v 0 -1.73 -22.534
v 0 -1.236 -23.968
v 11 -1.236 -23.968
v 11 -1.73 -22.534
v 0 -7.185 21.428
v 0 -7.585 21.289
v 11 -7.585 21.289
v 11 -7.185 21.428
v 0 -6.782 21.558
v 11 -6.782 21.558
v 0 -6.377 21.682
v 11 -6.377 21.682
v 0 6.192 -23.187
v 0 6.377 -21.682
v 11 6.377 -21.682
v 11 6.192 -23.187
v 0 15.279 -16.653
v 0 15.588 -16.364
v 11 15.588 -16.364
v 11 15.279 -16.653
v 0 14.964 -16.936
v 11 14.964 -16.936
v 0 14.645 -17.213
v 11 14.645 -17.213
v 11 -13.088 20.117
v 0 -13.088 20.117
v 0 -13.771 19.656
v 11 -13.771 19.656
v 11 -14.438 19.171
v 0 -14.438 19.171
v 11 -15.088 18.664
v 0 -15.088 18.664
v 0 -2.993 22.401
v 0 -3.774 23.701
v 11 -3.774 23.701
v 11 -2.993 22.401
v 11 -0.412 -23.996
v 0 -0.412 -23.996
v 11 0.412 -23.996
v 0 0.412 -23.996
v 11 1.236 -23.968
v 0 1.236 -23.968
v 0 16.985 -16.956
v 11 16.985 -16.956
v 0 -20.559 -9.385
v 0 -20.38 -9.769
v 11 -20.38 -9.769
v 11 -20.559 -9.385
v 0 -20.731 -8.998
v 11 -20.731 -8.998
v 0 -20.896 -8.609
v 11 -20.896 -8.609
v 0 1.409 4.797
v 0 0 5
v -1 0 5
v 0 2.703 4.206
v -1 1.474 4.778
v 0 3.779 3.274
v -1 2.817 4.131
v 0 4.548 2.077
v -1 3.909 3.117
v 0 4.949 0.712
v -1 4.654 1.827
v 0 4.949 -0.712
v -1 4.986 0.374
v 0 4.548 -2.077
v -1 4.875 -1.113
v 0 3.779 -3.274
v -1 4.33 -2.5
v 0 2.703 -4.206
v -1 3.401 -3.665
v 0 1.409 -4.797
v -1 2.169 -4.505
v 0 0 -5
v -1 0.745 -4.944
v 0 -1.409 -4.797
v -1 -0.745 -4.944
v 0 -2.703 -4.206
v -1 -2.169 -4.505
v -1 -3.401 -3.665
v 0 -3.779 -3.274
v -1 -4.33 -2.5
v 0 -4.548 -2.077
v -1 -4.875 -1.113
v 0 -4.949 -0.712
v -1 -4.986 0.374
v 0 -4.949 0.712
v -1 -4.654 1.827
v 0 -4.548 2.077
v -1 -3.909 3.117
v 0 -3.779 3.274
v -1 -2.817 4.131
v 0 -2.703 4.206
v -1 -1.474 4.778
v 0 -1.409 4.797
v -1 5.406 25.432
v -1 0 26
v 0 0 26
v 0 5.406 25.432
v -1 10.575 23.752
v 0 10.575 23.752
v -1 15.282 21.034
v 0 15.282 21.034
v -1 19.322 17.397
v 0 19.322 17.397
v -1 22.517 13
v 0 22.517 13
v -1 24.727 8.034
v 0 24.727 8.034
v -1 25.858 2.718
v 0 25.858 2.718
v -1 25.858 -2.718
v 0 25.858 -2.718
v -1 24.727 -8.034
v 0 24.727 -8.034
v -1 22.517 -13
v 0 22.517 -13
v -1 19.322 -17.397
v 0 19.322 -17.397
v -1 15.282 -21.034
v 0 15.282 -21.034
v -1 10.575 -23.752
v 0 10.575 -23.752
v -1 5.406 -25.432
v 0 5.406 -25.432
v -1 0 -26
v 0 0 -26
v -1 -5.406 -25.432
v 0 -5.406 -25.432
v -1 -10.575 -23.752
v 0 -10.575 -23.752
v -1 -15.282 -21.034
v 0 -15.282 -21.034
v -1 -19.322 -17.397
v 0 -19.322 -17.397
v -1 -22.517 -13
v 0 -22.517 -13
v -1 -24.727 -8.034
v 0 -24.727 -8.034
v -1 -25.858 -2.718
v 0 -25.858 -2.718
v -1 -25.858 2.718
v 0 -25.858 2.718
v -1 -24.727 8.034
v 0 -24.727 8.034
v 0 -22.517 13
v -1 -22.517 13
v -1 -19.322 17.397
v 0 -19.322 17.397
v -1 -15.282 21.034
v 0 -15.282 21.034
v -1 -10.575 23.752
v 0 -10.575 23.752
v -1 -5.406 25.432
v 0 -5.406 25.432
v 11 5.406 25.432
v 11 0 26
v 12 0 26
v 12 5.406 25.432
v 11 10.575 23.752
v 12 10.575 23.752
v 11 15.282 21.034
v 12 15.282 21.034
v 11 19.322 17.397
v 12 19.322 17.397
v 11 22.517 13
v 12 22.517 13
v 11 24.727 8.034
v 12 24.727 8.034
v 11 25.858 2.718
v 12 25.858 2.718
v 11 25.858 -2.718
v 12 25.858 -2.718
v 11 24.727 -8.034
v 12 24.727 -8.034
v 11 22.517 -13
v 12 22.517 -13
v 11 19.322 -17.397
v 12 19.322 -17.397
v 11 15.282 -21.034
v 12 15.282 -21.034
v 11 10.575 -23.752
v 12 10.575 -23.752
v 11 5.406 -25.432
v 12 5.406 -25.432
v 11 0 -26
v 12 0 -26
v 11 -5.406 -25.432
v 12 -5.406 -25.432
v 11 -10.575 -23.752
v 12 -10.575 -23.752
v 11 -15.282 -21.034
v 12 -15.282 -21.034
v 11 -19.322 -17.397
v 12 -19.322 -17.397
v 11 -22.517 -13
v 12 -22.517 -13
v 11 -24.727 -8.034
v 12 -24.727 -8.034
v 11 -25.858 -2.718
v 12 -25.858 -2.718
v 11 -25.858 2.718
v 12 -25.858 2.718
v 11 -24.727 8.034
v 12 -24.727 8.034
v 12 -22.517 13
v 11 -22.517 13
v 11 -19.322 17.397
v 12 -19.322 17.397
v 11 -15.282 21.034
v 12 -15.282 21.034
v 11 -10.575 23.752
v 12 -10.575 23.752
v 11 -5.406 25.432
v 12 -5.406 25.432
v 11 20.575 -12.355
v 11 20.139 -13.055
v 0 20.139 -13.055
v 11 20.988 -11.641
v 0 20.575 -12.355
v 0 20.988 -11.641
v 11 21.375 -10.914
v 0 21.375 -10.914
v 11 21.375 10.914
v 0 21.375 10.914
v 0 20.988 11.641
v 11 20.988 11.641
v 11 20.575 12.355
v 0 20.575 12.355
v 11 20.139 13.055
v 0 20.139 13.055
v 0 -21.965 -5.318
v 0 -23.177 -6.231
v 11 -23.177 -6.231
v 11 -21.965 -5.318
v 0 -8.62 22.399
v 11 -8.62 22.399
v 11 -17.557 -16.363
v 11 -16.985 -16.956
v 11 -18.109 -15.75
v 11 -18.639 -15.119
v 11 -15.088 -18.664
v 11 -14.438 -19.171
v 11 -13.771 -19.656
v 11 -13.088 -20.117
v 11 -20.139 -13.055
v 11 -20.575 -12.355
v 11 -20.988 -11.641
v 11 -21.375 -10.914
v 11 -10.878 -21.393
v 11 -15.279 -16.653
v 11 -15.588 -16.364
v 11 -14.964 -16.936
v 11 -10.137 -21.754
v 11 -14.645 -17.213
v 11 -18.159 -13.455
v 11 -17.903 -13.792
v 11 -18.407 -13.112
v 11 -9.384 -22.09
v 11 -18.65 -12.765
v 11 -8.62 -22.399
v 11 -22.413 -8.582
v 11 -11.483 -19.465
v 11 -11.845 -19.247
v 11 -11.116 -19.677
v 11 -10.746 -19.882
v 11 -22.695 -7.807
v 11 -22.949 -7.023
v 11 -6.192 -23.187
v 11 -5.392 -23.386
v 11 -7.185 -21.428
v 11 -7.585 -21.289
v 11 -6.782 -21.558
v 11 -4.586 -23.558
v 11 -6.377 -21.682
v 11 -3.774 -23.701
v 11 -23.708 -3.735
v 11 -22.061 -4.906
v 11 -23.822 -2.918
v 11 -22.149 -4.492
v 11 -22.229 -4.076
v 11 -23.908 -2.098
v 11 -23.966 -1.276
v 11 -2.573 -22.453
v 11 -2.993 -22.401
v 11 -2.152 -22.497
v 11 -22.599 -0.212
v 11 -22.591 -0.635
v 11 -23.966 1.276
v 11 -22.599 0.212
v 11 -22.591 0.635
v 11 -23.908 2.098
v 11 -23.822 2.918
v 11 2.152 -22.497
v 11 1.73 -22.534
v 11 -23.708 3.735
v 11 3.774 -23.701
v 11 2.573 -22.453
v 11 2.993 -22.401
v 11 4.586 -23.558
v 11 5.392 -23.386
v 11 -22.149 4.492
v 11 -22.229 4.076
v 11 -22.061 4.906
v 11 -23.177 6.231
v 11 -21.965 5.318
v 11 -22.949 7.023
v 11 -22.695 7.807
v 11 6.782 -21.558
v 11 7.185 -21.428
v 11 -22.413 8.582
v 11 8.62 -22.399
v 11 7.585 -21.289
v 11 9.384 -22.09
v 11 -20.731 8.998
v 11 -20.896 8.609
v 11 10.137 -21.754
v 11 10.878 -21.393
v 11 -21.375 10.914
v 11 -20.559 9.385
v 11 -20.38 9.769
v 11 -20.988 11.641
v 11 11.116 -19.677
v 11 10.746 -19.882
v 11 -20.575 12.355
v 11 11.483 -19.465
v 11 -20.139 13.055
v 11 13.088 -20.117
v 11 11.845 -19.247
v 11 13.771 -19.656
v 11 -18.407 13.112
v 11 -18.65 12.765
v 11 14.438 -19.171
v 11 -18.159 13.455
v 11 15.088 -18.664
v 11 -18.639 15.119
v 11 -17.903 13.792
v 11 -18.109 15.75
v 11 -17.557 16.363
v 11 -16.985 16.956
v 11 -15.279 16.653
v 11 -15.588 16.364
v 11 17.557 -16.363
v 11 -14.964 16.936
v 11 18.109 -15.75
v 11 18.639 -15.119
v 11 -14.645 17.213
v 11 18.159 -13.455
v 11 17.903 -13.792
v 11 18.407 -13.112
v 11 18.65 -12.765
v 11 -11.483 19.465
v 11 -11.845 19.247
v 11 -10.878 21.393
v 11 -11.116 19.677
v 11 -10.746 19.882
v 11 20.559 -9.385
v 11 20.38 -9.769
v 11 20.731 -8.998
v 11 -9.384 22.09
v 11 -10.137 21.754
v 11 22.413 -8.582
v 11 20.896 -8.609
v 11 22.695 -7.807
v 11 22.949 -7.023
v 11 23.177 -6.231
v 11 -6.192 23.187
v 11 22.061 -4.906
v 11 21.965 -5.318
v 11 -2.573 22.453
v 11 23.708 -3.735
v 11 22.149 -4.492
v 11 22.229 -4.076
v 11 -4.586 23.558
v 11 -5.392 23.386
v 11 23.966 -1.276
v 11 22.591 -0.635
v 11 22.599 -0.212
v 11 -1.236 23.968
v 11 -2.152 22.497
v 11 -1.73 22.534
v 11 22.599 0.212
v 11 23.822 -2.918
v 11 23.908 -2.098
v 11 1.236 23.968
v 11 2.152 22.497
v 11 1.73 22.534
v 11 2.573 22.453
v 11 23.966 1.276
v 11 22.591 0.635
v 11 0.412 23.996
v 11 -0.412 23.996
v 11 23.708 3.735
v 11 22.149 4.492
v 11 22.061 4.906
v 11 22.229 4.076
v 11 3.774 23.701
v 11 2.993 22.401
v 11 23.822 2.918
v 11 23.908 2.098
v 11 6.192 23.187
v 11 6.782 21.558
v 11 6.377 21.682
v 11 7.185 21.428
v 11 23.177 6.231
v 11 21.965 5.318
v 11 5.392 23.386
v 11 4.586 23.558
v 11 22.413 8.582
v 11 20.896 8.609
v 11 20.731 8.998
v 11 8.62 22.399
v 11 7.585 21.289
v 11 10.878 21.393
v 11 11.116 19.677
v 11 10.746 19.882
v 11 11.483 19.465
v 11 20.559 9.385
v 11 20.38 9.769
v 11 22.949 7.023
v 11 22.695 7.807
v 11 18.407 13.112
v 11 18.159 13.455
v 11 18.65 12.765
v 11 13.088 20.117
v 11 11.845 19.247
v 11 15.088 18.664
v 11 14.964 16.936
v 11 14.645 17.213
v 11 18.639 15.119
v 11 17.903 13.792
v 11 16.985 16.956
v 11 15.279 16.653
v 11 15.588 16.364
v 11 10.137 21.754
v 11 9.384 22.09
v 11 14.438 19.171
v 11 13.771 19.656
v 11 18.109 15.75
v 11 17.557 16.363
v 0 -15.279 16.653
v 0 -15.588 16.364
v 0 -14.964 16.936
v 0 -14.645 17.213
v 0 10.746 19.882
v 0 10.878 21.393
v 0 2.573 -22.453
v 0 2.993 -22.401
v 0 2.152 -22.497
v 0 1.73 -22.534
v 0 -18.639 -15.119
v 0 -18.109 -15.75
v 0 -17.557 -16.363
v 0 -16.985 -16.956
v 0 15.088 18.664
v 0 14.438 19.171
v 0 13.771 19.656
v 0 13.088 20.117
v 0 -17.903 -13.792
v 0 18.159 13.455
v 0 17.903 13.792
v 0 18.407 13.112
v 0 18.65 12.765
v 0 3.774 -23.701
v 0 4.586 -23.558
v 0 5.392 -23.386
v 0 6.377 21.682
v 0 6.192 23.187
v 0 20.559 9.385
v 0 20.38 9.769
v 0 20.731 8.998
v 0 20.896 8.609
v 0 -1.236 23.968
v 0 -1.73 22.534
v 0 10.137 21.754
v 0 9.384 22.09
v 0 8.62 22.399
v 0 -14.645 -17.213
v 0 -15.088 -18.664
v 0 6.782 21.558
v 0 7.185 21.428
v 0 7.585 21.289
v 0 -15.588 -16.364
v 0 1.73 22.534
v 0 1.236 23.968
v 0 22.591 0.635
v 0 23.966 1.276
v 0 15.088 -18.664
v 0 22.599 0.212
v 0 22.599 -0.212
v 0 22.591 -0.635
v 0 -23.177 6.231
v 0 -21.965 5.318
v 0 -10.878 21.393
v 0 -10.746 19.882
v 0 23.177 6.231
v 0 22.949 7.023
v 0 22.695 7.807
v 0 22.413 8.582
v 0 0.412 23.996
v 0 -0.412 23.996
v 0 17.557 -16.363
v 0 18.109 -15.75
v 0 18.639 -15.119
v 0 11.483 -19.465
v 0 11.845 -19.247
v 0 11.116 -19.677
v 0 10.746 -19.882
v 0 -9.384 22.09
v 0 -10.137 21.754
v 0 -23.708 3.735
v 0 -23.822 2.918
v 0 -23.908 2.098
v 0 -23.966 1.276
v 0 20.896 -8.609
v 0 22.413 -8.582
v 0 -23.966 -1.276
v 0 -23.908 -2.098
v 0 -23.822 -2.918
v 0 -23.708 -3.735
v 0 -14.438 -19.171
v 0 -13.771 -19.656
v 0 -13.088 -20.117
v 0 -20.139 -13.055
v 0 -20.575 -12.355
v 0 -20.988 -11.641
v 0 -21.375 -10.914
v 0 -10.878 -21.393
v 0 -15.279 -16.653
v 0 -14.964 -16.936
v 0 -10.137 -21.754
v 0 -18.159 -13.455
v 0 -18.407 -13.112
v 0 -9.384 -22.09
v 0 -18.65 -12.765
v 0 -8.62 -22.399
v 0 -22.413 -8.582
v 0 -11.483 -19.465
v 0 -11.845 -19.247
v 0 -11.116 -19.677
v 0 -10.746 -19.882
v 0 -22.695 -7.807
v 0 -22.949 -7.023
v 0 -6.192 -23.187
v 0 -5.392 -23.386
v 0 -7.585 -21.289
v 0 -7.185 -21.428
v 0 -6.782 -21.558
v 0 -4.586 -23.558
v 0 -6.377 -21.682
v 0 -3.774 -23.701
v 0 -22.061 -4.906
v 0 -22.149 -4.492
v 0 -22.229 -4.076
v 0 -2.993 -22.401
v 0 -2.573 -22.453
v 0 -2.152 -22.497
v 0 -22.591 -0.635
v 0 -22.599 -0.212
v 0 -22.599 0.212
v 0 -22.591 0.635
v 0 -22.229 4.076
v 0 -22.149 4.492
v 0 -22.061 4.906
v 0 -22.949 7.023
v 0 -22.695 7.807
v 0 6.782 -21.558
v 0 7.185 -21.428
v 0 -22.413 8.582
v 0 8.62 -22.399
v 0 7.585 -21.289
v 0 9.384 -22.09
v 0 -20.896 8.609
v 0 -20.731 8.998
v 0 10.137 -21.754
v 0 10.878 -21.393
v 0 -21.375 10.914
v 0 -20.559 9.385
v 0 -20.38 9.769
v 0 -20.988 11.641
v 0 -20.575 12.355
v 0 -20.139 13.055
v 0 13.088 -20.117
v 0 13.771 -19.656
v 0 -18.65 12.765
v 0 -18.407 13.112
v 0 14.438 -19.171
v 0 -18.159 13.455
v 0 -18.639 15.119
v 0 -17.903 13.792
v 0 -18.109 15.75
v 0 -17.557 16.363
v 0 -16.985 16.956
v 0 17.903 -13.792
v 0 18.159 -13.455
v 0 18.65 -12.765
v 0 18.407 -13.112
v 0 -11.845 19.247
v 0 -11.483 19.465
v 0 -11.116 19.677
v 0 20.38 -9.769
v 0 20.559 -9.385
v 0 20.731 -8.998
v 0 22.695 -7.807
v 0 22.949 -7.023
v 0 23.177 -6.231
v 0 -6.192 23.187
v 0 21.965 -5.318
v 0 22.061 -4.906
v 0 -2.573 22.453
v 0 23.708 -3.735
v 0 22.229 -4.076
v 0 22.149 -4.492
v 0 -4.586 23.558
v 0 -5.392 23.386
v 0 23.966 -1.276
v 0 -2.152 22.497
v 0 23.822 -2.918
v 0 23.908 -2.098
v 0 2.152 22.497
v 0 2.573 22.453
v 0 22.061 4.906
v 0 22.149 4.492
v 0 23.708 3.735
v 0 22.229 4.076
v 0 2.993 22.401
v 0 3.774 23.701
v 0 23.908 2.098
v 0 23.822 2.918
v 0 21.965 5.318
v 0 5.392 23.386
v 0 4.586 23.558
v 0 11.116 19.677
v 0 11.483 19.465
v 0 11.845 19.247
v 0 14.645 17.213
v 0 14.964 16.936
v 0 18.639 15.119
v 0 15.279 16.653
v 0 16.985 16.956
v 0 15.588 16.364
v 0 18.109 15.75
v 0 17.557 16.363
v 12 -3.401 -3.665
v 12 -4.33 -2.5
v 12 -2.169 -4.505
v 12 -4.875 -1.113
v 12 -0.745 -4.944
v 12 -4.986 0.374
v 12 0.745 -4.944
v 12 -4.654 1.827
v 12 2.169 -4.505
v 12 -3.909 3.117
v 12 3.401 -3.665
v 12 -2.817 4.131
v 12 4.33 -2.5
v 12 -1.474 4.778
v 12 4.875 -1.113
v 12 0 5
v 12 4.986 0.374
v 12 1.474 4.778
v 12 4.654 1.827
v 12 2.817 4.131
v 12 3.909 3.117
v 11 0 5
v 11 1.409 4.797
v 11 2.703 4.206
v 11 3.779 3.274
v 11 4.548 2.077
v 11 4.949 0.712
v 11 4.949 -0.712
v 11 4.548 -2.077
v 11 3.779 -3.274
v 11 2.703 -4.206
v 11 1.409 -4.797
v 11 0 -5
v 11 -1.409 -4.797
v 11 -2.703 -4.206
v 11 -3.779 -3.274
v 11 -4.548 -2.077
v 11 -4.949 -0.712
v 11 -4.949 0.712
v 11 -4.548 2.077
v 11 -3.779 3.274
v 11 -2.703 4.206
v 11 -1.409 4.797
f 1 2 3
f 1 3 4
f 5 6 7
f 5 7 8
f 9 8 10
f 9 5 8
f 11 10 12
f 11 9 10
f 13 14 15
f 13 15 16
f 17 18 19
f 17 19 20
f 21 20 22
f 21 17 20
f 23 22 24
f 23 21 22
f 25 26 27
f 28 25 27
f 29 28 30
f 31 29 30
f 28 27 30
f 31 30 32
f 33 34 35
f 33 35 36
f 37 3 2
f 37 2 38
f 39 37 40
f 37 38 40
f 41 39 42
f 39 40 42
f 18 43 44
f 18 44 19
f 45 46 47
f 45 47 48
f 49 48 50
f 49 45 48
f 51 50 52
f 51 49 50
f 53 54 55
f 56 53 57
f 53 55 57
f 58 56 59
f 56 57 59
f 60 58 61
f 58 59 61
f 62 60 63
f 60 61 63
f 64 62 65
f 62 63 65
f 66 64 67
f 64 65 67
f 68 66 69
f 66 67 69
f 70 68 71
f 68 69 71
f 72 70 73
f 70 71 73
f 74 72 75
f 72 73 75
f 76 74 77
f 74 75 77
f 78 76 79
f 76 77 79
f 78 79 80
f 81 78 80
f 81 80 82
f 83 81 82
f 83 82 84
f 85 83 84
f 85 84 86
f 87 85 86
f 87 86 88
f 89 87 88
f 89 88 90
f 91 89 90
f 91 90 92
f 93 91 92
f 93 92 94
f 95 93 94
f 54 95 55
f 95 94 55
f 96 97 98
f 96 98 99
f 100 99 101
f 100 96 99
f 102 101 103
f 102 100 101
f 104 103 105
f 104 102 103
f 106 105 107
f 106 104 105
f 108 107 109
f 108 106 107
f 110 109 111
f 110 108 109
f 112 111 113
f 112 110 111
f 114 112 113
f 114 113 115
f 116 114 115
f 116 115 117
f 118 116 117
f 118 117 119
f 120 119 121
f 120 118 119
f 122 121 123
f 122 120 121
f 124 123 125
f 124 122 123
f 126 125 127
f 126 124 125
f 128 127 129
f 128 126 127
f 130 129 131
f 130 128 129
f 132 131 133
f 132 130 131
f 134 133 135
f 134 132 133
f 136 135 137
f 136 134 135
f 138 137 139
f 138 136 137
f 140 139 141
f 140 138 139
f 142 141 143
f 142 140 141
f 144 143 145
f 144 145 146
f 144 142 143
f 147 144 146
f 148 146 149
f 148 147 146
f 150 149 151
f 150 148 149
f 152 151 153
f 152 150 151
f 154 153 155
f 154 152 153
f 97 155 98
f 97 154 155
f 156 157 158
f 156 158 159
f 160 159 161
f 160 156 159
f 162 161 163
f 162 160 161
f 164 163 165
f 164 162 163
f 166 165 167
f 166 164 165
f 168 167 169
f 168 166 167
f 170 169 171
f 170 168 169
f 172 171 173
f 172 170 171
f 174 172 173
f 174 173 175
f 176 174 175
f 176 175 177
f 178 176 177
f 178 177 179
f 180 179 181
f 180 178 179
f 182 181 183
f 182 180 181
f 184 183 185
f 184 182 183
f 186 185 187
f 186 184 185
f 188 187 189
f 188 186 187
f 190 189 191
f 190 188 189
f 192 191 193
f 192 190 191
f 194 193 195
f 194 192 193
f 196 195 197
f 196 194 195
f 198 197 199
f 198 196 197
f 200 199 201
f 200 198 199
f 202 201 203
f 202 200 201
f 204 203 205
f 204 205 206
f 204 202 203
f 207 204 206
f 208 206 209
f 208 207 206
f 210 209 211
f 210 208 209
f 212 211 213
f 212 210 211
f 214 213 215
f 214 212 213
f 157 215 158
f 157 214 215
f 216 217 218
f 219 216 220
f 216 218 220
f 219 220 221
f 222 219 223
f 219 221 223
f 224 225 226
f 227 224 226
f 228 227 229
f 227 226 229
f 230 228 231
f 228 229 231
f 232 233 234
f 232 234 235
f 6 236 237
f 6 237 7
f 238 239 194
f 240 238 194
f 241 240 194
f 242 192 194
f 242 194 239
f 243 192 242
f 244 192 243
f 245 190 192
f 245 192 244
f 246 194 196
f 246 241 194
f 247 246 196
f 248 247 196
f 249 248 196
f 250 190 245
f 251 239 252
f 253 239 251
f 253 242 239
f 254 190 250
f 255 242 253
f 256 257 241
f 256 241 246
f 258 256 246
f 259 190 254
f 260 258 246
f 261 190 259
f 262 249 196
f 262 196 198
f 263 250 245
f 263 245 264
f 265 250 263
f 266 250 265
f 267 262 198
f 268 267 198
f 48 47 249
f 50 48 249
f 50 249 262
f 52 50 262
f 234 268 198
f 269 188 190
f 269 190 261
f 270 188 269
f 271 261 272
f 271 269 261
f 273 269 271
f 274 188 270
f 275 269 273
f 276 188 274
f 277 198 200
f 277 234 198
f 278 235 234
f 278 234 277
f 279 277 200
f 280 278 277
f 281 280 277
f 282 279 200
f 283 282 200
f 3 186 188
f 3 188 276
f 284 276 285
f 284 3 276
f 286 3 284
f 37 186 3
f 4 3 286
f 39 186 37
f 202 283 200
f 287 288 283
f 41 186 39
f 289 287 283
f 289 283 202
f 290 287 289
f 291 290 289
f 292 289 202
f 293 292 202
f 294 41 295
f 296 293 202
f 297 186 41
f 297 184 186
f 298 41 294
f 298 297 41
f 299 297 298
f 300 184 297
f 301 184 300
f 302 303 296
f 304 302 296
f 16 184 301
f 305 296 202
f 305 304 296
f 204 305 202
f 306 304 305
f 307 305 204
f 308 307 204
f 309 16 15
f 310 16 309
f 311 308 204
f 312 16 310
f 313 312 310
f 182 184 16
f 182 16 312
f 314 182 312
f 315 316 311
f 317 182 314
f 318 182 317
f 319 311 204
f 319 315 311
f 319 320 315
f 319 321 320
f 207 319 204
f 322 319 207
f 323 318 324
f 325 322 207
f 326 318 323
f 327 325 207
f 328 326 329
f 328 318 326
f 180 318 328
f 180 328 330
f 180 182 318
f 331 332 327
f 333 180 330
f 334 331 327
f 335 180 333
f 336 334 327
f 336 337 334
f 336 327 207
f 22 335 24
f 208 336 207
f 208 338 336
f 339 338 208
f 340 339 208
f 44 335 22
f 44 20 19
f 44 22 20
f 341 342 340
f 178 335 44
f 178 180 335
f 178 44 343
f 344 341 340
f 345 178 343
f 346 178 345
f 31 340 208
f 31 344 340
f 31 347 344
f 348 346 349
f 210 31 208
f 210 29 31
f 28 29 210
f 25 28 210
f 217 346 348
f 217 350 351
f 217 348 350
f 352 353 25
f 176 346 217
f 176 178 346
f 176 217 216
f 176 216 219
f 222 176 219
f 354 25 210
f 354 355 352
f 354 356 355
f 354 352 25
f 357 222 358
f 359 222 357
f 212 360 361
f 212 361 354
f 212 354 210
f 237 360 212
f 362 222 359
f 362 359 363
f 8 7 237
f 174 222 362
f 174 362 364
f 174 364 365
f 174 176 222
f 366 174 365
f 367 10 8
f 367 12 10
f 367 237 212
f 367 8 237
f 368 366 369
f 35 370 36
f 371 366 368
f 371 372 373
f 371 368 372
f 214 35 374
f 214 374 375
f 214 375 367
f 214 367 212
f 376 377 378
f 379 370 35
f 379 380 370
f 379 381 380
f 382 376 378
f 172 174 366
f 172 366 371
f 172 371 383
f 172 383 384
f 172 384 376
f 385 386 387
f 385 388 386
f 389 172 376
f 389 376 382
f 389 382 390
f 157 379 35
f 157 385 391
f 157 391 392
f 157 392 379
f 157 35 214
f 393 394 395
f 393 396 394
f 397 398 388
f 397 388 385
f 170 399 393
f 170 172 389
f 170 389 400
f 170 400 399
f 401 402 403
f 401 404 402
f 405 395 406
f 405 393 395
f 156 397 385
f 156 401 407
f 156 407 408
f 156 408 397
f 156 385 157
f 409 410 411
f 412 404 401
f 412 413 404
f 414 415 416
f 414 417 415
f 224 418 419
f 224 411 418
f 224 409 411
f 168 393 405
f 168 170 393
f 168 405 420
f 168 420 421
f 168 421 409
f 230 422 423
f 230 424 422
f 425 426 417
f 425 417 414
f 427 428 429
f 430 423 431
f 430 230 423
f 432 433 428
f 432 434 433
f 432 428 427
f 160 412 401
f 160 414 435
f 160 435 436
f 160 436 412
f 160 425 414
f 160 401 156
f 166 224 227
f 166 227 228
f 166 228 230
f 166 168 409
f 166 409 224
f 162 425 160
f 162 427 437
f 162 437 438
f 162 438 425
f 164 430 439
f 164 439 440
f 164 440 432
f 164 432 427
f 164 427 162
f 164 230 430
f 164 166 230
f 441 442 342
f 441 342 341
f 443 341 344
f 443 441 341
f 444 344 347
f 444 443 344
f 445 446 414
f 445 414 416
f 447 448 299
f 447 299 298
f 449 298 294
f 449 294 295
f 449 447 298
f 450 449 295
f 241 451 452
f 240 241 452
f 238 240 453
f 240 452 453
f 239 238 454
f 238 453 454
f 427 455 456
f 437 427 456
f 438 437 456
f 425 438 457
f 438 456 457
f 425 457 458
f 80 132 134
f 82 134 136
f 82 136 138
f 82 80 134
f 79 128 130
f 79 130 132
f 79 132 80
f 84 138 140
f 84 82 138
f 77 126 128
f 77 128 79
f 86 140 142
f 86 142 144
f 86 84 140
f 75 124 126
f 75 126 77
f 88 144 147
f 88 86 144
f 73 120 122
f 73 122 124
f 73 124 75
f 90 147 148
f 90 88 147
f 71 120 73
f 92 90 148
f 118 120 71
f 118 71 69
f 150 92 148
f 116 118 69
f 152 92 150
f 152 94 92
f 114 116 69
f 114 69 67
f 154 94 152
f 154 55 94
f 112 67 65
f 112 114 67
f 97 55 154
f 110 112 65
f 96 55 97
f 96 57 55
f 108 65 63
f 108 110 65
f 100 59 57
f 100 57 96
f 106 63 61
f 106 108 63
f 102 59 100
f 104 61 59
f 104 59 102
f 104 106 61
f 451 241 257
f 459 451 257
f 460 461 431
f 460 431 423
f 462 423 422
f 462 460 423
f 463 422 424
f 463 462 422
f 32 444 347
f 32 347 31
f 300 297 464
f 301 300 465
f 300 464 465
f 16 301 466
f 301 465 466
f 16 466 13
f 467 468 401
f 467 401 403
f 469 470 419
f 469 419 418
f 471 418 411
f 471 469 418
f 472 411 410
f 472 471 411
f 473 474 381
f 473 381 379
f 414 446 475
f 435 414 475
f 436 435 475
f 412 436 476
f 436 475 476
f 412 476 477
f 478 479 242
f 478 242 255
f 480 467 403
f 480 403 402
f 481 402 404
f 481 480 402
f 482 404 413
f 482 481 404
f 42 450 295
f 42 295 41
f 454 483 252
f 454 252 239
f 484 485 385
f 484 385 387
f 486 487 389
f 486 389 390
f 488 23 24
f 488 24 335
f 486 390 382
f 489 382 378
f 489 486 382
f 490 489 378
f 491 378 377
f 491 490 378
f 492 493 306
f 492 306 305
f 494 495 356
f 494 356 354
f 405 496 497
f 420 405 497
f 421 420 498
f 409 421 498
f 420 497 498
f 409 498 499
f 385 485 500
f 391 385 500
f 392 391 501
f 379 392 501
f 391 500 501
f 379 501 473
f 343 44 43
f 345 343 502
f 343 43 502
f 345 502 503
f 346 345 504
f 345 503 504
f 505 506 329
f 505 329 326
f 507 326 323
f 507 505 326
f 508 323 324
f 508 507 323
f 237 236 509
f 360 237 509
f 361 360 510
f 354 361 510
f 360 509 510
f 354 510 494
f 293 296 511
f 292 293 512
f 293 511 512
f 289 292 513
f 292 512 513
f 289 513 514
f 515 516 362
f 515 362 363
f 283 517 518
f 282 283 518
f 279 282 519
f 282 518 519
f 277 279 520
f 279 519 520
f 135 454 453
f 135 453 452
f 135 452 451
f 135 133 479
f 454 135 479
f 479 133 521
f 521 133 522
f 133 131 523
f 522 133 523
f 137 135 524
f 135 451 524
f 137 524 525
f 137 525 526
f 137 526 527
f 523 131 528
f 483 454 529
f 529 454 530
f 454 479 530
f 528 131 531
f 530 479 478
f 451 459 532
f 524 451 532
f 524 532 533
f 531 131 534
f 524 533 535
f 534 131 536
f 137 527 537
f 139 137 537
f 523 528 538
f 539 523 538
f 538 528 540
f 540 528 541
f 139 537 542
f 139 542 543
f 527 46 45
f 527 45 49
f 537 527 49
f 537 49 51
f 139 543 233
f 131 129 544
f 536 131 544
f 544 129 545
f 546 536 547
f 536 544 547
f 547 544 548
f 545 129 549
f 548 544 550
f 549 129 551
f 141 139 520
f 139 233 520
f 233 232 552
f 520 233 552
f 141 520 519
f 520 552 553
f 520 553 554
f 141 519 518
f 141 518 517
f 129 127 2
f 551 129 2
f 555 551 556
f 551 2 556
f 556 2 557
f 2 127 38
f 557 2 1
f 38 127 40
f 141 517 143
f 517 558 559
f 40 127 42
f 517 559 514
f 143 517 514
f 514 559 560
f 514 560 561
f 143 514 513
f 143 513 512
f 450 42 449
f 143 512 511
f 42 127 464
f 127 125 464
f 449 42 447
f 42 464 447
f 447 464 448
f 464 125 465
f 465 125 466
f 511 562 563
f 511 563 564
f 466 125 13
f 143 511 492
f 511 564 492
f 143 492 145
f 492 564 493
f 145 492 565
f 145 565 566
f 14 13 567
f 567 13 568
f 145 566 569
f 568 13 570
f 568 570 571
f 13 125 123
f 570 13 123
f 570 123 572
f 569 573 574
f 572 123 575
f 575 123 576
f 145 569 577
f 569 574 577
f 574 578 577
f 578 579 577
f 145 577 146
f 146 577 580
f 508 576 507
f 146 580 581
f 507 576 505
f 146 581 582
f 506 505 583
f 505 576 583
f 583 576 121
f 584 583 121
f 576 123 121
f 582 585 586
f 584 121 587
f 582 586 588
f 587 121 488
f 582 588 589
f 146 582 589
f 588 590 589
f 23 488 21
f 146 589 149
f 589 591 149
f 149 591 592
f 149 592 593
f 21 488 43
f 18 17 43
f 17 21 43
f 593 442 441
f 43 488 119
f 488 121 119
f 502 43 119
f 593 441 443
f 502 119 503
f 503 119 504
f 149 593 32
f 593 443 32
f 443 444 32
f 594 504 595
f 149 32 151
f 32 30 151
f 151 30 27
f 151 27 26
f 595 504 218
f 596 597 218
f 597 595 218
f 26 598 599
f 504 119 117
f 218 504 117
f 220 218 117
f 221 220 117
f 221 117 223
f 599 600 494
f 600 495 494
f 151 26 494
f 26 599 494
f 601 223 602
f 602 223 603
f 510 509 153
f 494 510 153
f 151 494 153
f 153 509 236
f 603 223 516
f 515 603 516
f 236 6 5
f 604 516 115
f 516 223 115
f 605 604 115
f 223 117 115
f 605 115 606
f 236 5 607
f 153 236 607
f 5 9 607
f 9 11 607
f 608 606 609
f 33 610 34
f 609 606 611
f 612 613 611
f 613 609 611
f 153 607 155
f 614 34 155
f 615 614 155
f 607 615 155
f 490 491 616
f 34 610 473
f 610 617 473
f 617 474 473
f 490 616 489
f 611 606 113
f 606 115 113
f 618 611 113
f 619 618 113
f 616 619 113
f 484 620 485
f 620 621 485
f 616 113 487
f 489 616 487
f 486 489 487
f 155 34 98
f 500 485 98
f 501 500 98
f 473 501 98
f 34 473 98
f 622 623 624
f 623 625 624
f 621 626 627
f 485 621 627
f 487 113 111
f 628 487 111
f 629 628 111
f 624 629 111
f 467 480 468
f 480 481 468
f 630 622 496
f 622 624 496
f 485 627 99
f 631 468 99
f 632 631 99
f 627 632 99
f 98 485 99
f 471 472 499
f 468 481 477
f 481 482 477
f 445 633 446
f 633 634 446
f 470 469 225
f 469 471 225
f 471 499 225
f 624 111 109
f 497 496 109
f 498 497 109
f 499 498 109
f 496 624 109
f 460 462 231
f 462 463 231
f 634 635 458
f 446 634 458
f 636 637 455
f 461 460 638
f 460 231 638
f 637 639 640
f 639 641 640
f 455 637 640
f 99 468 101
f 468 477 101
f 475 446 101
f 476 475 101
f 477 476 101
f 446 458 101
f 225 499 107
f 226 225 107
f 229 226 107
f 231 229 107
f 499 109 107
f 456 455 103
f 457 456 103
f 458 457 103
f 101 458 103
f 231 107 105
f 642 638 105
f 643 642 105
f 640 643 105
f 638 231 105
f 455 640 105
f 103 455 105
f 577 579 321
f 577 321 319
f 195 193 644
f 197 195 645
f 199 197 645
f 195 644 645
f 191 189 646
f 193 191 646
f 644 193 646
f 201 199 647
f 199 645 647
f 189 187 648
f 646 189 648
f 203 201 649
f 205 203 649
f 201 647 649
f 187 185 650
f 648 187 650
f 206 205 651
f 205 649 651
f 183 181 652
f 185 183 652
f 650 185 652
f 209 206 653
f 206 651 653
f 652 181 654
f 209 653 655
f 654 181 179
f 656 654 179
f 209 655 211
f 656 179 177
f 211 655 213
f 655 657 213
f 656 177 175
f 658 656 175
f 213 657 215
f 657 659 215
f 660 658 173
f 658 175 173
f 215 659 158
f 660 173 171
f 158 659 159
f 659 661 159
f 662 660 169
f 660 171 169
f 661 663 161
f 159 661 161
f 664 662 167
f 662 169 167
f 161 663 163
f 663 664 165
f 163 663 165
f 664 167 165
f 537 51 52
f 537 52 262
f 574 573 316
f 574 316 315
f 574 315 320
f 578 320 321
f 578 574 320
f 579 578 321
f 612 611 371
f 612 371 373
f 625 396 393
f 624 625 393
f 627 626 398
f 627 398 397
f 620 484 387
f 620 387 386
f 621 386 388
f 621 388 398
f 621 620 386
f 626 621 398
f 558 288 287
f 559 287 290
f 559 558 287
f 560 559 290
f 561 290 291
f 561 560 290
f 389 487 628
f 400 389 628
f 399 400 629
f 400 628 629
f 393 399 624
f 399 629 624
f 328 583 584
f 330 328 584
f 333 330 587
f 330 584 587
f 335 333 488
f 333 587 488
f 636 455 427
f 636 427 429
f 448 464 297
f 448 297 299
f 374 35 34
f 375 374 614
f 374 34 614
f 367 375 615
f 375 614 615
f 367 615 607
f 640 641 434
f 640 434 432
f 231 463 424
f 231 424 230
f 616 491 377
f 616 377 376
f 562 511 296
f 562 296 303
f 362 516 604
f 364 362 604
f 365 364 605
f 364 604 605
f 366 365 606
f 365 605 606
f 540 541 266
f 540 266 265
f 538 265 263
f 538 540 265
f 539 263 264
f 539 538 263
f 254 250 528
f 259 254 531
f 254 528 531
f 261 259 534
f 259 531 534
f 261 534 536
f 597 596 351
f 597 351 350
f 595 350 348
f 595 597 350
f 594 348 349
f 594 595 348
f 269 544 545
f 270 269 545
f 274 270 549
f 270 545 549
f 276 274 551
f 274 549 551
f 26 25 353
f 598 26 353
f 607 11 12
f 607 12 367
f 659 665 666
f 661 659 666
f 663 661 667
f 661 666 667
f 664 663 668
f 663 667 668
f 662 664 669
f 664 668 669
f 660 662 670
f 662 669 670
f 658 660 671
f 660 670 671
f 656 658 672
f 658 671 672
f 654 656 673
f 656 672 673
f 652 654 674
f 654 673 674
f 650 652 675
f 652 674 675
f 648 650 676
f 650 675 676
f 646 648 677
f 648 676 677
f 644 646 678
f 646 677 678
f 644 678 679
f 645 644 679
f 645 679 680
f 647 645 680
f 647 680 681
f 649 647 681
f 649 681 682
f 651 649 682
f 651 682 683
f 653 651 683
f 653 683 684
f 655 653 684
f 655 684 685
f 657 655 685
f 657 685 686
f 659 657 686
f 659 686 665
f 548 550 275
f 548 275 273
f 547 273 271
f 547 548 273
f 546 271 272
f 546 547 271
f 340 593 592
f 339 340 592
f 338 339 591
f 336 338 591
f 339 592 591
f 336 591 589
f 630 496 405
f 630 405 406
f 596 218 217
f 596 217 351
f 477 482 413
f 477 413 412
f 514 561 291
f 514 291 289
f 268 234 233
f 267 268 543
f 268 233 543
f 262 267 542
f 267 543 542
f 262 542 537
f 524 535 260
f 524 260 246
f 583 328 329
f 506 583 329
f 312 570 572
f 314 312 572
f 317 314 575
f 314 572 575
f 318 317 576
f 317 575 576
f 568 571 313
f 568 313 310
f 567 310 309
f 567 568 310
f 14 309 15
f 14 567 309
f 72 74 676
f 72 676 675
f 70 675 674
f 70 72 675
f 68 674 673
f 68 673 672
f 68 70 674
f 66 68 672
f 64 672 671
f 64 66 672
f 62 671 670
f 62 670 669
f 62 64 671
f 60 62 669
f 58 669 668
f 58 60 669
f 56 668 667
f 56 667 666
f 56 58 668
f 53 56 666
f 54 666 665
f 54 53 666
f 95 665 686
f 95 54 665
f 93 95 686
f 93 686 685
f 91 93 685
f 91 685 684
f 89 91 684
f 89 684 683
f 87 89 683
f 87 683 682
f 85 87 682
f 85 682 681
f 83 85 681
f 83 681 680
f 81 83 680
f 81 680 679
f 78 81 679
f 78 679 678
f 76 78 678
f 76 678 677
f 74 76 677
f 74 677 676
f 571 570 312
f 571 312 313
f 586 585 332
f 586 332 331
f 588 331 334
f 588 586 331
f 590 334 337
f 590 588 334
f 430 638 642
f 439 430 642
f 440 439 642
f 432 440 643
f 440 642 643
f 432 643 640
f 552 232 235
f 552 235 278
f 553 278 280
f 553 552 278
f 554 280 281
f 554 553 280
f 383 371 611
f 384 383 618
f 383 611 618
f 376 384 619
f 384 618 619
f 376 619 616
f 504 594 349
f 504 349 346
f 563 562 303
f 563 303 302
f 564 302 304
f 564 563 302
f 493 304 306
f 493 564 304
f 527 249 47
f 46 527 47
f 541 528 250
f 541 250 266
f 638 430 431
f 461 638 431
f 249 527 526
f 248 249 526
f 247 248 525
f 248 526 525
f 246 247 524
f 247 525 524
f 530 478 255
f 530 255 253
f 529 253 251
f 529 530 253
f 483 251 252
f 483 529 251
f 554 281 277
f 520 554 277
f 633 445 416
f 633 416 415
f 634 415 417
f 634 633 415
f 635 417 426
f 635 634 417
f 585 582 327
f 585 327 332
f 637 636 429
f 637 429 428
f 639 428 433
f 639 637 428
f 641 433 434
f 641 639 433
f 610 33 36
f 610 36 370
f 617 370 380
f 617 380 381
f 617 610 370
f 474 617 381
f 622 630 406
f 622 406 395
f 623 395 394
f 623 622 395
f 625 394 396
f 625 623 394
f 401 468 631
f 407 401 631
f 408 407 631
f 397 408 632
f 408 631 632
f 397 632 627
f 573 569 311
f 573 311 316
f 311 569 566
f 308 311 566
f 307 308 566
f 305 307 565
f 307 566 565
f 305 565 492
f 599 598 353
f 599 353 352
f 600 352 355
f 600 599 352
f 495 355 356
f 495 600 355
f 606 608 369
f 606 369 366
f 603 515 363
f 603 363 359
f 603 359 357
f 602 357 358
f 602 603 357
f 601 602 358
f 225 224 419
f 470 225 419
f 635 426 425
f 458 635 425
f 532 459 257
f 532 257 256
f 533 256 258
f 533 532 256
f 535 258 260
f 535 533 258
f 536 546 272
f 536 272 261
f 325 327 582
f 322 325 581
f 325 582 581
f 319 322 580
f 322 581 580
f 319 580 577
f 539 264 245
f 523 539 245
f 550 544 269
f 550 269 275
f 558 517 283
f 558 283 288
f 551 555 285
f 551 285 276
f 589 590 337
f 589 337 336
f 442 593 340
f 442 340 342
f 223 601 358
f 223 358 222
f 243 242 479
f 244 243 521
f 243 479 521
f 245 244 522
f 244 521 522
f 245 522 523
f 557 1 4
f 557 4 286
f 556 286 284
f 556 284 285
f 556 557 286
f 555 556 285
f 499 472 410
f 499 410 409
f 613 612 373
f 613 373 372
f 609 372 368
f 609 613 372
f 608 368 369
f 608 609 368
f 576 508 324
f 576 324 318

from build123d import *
from build123d.topology import SkipClean

# Parameters (mm, degrees)
SKETCH1_R           = 24
SKETCH1_R_2         = 5
BOSS_EXTRUDE1_DEPTH = 11
CUT_EXTRUDE1_DEPTH  = 36.67912555
BOSS_EXTRUDE2_START = 1
SKETCH3_R           = 26
SKETCH3_R_2         = 5
BOSS_EXTRUDE2_DEPTH = 1
LPATTERN1_COUNT     = 2
LPATTERN1_PITCH     = 12


with BuildPart() as part:
    # Sketch1 → Boss-Extrude1 (new body)
    with BuildSketch(Plane(origin=(0, 0, 0), x_dir=(0, 0, -1), z_dir=(1, 0, 0))):
        Circle(SKETCH1_R)
        Circle(SKETCH1_R_2, mode=Mode.SUBTRACT)
    extrude(amount=BOSS_EXTRUDE1_DEPTH)

    # Sketch2 → Cut-Extrude1 (cut, through all)
    with BuildSketch(Plane.ZY):
        with BuildLine():
            Line((1.276076386, 23.966051595), (0.634916452, 22.59107968))
            ThreePointArc((0.634916452, 22.59107968), (0, 22.6), (-0.634916452, 22.59107968))
            Line((-0.634916452, 22.59107968), (-1.276076386, 23.966051595))
            ThreePointArc((-1.276076386, 23.966051595), (0, 24), (1.276076386, 23.966051595))
        make_face()
        with BuildLine():
            Line((6.231013365, 23.177024668), (5.317991578, 21.965403834))
            ThreePointArc((5.317991578, 21.965403834), (4.698804212, 22.106135777), (4.075907569, 22.22941694))
            Line((4.075907569, 22.22941694), (3.734631254, 23.707647066))
            ThreePointArc((3.734631254, 23.707647066), (4.98988058, 23.475542418), (6.231013365, 23.177024668))
        make_face()
        with BuildLine():
            Line((10.913625159, 21.375050547), (9.768644953, 20.379734438))
            ThreePointArc((9.768644953, 20.379734438), (9.192248134, 20.646127343), (8.608594872, 20.896222011))
            Line((8.608594872, 20.896222011), (8.582117588, 22.413104598))
            ThreePointArc((8.582117588, 22.413104598), (9.761679434, 21.925090983), (10.913625159, 21.375050547))
        make_face()
        with BuildLine():
            Line((15.119259166, 18.638884148), (13.792361669, 17.903372855))
            ThreePointArc((13.792361669, 17.903372855), (13.283946702, 18.283784073), (12.765045269, 18.649761909))
            Line((12.765045269, 18.649761909), (13.054524201, 20.139001909))
            ThreePointArc((13.054524201, 20.139001909), (14.106846055, 19.416407865), (15.119259166, 18.638884148))
        make_face()
        with BuildLine():
            Line((18.664108996, 15.088109073), (17.213285997, 14.644547969))
            ThreePointArc((17.213285997, 14.644547969), (16.795073056, 15.122351704), (16.363601935, 15.58821772))
            Line((16.363601935, 15.58821772), (16.956385464, 16.984728199))
            ThreePointArc((16.956385464, 16.984728199), (17.835475811, 16.059134553), (18.664108996, 15.088109073))
        make_face()
        with BuildLine():
            Line((21.393247703, 10.87791123), (19.881907128, 10.745686063))
            ThreePointArc((19.881907128, 10.745686063), (19.572174126, 11.3), (19.246990676, 11.845393617))
            Line((19.246990676, 11.845393617), (20.117171317, 13.088140365))
            ThreePointArc((20.117171317, 13.088140365), (20.784609691, 12), (21.393247703, 10.87791123))
        make_face()
        with BuildLine():
            Line((23.187398829, 6.192296469), (21.681593513, 6.377186113))
            ThreePointArc((21.681593513, 6.377186113), (21.493877268, 6.983784073), (21.289193566, 7.584868971))
            Line((21.289193566, 7.584868971), (22.39874025, 8.619537993))
            ThreePointArc((22.39874025, 8.619537993), (22.825356391, 7.416407865), (23.187398829, 6.192296469))
        make_face()
        with BuildLine():
            Line((23.96814936, 1.236048638), (22.533690223, 1.729972529))
            ThreePointArc((22.533690223, 1.729972529), (22.476194835, 2.36234327), (22.400956541, 2.992849156))
            Line((22.400956541, 2.992849156), (23.701376753, 3.77422045))
            ThreePointArc((23.701376753, 3.77422045), (23.868525489, 2.508683118), (23.96814936, 1.236048638))
        make_face()
        with BuildLine():
            Line((23.701376753, -3.77422045), (22.400956541, -2.992849156))
            ThreePointArc((22.400956541, -2.992849156), (22.476194835, -2.36234327), (22.533690223, -1.729972529))
            Line((22.533690223, -1.729972529), (23.96814936, -1.236048638))
            ThreePointArc((23.96814936, -1.236048638), (23.868525489, -2.508683118), (23.701376753, -3.77422045))
        make_face()
        with BuildLine():
            Line((22.39874025, -8.619537993), (21.289193566, -7.584868971))
            ThreePointArc((21.289193566, -7.584868971), (21.493877268, -6.983784073), (21.681593513, -6.377186113))
            Line((21.681593513, -6.377186113), (23.187398829, -6.192296469))
            ThreePointArc((23.187398829, -6.192296469), (22.825356391, -7.416407865), (22.39874025, -8.619537993))
        make_face()
        with BuildLine():
            Line((20.117171317, -13.088140365), (19.246990676, -11.845393617))
            ThreePointArc((19.246990676, -11.845393617), (19.572174126, -11.3), (19.881907128, -10.745686063))
            Line((19.881907128, -10.745686063), (21.393247703, -10.87791123))
            ThreePointArc((21.393247703, -10.87791123), (20.784609691, -12), (20.117171317, -13.088140365))
        make_face()
        with BuildLine():
            Line((16.956385464, -16.984728199), (16.363601935, -15.58821772))
            ThreePointArc((16.363601935, -15.58821772), (16.795073056, -15.122351704), (17.213285997, -14.644547969))
            Line((17.213285997, -14.644547969), (18.664108996, -15.088109073))
            ThreePointArc((18.664108996, -15.088109073), (17.835475811, -16.059134553), (16.956385464, -16.984728199))
        make_face()
        with BuildLine():
            Line((13.054524201, -20.139001909), (12.765045269, -18.649761909))
            ThreePointArc((12.765045269, -18.649761909), (13.283946702, -18.283784073), (13.792361669, -17.903372855))
            Line((13.792361669, -17.903372855), (15.119259166, -18.638884148))
            ThreePointArc((15.119259166, -18.638884148), (14.106846055, -19.416407865), (13.054524201, -20.139001909))
        make_face()
        with BuildLine():
            Line((8.582117588, -22.413104598), (8.608594872, -20.896222011))
            ThreePointArc((8.608594872, -20.896222011), (9.192248134, -20.646127343), (9.768644953, -20.379734438))
            Line((9.768644953, -20.379734438), (10.913625159, -21.375050547))
            ThreePointArc((10.913625159, -21.375050547), (9.761679434, -21.925090983), (8.582117588, -22.413104598))
        make_face()
        with BuildLine():
            Line((3.734631254, -23.707647066), (4.075907569, -22.22941694))
            ThreePointArc((4.075907569, -22.22941694), (4.698804212, -22.106135777), (5.317991578, -21.965403834))
            Line((5.317991578, -21.965403834), (6.231013365, -23.177024668))
            ThreePointArc((6.231013365, -23.177024668), (4.98988058, -23.475542418), (3.734631254, -23.707647066))
        make_face()
        with BuildLine():
            Line((-1.276076386, -23.966051595), (-0.634916452, -22.59107968))
            ThreePointArc((-0.634916452, -22.59107968), (0, -22.6), (0.634916452, -22.59107968))
            Line((0.634916452, -22.59107968), (1.276076386, -23.966051595))
            ThreePointArc((1.276076386, -23.966051595), (0, -24), (-1.276076386, -23.966051595))
        make_face()
        with BuildLine():
            Line((-6.231013365, -23.177024668), (-5.317991578, -21.965403834))
            ThreePointArc((-5.317991578, -21.965403834), (-4.698804212, -22.106135777), (-4.075907569, -22.22941694))
            Line((-4.075907569, -22.22941694), (-3.734631254, -23.707647066))
            ThreePointArc((-3.734631254, -23.707647066), (-4.98988058, -23.475542418), (-6.231013365, -23.177024668))
        make_face()
        with BuildLine():
            Line((-10.913625159, -21.375050547), (-9.768644953, -20.379734438))
            ThreePointArc((-9.768644953, -20.379734438), (-9.192248134, -20.646127343), (-8.608594872, -20.896222011))
            Line((-8.608594872, -20.896222011), (-8.582117588, -22.413104598))
            ThreePointArc((-8.582117588, -22.413104598), (-9.761679434, -21.925090983), (-10.913625159, -21.375050547))
        make_face()
        with BuildLine():
            Line((-15.119259166, -18.638884148), (-13.792361669, -17.903372855))
            ThreePointArc((-13.792361669, -17.903372855), (-13.283946702, -18.283784073), (-12.765045269, -18.649761909))
            Line((-12.765045269, -18.649761909), (-13.054524201, -20.139001909))
            ThreePointArc((-13.054524201, -20.139001909), (-14.106846055, -19.416407865), (-15.119259166, -18.638884148))
        make_face()
        with BuildLine():
            Line((-18.664108996, -15.088109073), (-17.213285997, -14.644547969))
            ThreePointArc((-17.213285997, -14.644547969), (-16.795073056, -15.122351704), (-16.363601935, -15.58821772))
            Line((-16.363601935, -15.58821772), (-16.956385464, -16.984728199))
            ThreePointArc((-16.956385464, -16.984728199), (-17.835475811, -16.059134553), (-18.664108996, -15.088109073))
        make_face()
        with BuildLine():
            Line((-21.393247703, -10.87791123), (-19.881907128, -10.745686063))
            ThreePointArc((-19.881907128, -10.745686063), (-19.572174126, -11.3), (-19.246990676, -11.845393617))
            Line((-19.246990676, -11.845393617), (-20.117171317, -13.088140365))
            ThreePointArc((-20.117171317, -13.088140365), (-20.784609691, -12), (-21.393247703, -10.87791123))
        make_face()
        with BuildLine():
            Line((-23.187398829, -6.192296469), (-21.681593513, -6.377186113))
            ThreePointArc((-21.681593513, -6.377186113), (-21.493877268, -6.983784073), (-21.289193566, -7.584868971))
            Line((-21.289193566, -7.584868971), (-22.39874025, -8.619537993))
            ThreePointArc((-22.39874025, -8.619537993), (-22.825356391, -7.416407865), (-23.187398829, -6.192296469))
        make_face()
        with BuildLine():
            Line((-23.96814936, -1.236048638), (-22.533690223, -1.729972529))
            ThreePointArc((-22.533690223, -1.729972529), (-22.476194835, -2.36234327), (-22.400956541, -2.992849156))
            Line((-22.400956541, -2.992849156), (-23.701376753, -3.77422045))
            ThreePointArc((-23.701376753, -3.77422045), (-23.868525489, -2.508683118), (-23.96814936, -1.236048638))
        make_face()
        with BuildLine():
            Line((-23.701376753, 3.77422045), (-22.400956541, 2.992849156))
            ThreePointArc((-22.400956541, 2.992849156), (-22.476194835, 2.36234327), (-22.533690223, 1.729972529))
            Line((-22.533690223, 1.729972529), (-23.96814936, 1.236048638))
            ThreePointArc((-23.96814936, 1.236048638), (-23.868525489, 2.508683118), (-23.701376753, 3.77422045))
        make_face()
        with BuildLine():
            Line((-22.39874025, 8.619537993), (-21.289193566, 7.584868971))
            ThreePointArc((-21.289193566, 7.584868971), (-21.493877268, 6.983784073), (-21.681593513, 6.377186113))
            Line((-21.681593513, 6.377186113), (-23.187398829, 6.192296469))
            ThreePointArc((-23.187398829, 6.192296469), (-22.825356391, 7.416407865), (-22.39874025, 8.619537993))
        make_face()
        with BuildLine():
            Line((-20.117171317, 13.088140365), (-19.246990676, 11.845393617))
            ThreePointArc((-19.246990676, 11.845393617), (-19.572174126, 11.3), (-19.881907128, 10.745686063))
            Line((-19.881907128, 10.745686063), (-21.393247703, 10.87791123))
            ThreePointArc((-21.393247703, 10.87791123), (-20.784609691, 12), (-20.117171317, 13.088140365))
        make_face()
        with BuildLine():
            Line((-16.956385464, 16.984728199), (-16.363601935, 15.58821772))
            ThreePointArc((-16.363601935, 15.58821772), (-16.795073056, 15.122351704), (-17.213285997, 14.644547969))
            Line((-17.213285997, 14.644547969), (-18.664108996, 15.088109073))
            ThreePointArc((-18.664108996, 15.088109073), (-17.835475811, 16.059134553), (-16.956385464, 16.984728199))
        make_face()
        with BuildLine():
            Line((-13.054524201, 20.139001909), (-12.765045269, 18.649761909))
            ThreePointArc((-12.765045269, 18.649761909), (-13.283946702, 18.283784073), (-13.792361669, 17.903372855))
            Line((-13.792361669, 17.903372855), (-15.119259166, 18.638884148))
            ThreePointArc((-15.119259166, 18.638884148), (-14.106846055, 19.416407865), (-13.054524201, 20.139001909))
        make_face()
        with BuildLine():
            Line((-8.582117588, 22.413104598), (-8.608594872, 20.896222011))
            ThreePointArc((-8.608594872, 20.896222011), (-9.192248134, 20.646127343), (-9.768644953, 20.379734438))
            Line((-9.768644953, 20.379734438), (-10.913625159, 21.375050547))
            ThreePointArc((-10.913625159, 21.375050547), (-9.761679434, 21.925090983), (-8.582117588, 22.413104598))
        make_face()
        with BuildLine():
            Line((-3.734631254, 23.707647066), (-4.075907569, 22.22941694))
            ThreePointArc((-4.075907569, 22.22941694), (-4.698804212, 22.106135777), (-5.317991578, 21.965403834))
            Line((-5.317991578, 21.965403834), (-6.231013365, 23.177024668))
            ThreePointArc((-6.231013365, 23.177024668), (-4.98988058, 23.475542418), (-3.734631254, 23.707647066))
        make_face()
    extrude(amount=-CUT_EXTRUDE1_DEPTH, mode=Mode.SUBTRACT)

    # Sketch3 → Boss-Extrude2 (add)
    with SkipClean():  # the faces are left unmerged after this step: merging them gives an invalid solid
        with BuildSketch(Plane.ZY.offset(BOSS_EXTRUDE2_START)):
            Circle(SKETCH3_R)
            Circle(SKETCH3_R_2, mode=Mode.SUBTRACT)
        boss_extrude2 = extrude(amount=-BOSS_EXTRUDE2_DEPTH)

    # LPattern1: Boss-Extrude2 ×2
    with Locations(*[(i * LPATTERN1_PITCH, 0, 0) for i in range(1, LPATTERN1_COUNT)]):
        add(boss_extrude2)


solid = part.part
